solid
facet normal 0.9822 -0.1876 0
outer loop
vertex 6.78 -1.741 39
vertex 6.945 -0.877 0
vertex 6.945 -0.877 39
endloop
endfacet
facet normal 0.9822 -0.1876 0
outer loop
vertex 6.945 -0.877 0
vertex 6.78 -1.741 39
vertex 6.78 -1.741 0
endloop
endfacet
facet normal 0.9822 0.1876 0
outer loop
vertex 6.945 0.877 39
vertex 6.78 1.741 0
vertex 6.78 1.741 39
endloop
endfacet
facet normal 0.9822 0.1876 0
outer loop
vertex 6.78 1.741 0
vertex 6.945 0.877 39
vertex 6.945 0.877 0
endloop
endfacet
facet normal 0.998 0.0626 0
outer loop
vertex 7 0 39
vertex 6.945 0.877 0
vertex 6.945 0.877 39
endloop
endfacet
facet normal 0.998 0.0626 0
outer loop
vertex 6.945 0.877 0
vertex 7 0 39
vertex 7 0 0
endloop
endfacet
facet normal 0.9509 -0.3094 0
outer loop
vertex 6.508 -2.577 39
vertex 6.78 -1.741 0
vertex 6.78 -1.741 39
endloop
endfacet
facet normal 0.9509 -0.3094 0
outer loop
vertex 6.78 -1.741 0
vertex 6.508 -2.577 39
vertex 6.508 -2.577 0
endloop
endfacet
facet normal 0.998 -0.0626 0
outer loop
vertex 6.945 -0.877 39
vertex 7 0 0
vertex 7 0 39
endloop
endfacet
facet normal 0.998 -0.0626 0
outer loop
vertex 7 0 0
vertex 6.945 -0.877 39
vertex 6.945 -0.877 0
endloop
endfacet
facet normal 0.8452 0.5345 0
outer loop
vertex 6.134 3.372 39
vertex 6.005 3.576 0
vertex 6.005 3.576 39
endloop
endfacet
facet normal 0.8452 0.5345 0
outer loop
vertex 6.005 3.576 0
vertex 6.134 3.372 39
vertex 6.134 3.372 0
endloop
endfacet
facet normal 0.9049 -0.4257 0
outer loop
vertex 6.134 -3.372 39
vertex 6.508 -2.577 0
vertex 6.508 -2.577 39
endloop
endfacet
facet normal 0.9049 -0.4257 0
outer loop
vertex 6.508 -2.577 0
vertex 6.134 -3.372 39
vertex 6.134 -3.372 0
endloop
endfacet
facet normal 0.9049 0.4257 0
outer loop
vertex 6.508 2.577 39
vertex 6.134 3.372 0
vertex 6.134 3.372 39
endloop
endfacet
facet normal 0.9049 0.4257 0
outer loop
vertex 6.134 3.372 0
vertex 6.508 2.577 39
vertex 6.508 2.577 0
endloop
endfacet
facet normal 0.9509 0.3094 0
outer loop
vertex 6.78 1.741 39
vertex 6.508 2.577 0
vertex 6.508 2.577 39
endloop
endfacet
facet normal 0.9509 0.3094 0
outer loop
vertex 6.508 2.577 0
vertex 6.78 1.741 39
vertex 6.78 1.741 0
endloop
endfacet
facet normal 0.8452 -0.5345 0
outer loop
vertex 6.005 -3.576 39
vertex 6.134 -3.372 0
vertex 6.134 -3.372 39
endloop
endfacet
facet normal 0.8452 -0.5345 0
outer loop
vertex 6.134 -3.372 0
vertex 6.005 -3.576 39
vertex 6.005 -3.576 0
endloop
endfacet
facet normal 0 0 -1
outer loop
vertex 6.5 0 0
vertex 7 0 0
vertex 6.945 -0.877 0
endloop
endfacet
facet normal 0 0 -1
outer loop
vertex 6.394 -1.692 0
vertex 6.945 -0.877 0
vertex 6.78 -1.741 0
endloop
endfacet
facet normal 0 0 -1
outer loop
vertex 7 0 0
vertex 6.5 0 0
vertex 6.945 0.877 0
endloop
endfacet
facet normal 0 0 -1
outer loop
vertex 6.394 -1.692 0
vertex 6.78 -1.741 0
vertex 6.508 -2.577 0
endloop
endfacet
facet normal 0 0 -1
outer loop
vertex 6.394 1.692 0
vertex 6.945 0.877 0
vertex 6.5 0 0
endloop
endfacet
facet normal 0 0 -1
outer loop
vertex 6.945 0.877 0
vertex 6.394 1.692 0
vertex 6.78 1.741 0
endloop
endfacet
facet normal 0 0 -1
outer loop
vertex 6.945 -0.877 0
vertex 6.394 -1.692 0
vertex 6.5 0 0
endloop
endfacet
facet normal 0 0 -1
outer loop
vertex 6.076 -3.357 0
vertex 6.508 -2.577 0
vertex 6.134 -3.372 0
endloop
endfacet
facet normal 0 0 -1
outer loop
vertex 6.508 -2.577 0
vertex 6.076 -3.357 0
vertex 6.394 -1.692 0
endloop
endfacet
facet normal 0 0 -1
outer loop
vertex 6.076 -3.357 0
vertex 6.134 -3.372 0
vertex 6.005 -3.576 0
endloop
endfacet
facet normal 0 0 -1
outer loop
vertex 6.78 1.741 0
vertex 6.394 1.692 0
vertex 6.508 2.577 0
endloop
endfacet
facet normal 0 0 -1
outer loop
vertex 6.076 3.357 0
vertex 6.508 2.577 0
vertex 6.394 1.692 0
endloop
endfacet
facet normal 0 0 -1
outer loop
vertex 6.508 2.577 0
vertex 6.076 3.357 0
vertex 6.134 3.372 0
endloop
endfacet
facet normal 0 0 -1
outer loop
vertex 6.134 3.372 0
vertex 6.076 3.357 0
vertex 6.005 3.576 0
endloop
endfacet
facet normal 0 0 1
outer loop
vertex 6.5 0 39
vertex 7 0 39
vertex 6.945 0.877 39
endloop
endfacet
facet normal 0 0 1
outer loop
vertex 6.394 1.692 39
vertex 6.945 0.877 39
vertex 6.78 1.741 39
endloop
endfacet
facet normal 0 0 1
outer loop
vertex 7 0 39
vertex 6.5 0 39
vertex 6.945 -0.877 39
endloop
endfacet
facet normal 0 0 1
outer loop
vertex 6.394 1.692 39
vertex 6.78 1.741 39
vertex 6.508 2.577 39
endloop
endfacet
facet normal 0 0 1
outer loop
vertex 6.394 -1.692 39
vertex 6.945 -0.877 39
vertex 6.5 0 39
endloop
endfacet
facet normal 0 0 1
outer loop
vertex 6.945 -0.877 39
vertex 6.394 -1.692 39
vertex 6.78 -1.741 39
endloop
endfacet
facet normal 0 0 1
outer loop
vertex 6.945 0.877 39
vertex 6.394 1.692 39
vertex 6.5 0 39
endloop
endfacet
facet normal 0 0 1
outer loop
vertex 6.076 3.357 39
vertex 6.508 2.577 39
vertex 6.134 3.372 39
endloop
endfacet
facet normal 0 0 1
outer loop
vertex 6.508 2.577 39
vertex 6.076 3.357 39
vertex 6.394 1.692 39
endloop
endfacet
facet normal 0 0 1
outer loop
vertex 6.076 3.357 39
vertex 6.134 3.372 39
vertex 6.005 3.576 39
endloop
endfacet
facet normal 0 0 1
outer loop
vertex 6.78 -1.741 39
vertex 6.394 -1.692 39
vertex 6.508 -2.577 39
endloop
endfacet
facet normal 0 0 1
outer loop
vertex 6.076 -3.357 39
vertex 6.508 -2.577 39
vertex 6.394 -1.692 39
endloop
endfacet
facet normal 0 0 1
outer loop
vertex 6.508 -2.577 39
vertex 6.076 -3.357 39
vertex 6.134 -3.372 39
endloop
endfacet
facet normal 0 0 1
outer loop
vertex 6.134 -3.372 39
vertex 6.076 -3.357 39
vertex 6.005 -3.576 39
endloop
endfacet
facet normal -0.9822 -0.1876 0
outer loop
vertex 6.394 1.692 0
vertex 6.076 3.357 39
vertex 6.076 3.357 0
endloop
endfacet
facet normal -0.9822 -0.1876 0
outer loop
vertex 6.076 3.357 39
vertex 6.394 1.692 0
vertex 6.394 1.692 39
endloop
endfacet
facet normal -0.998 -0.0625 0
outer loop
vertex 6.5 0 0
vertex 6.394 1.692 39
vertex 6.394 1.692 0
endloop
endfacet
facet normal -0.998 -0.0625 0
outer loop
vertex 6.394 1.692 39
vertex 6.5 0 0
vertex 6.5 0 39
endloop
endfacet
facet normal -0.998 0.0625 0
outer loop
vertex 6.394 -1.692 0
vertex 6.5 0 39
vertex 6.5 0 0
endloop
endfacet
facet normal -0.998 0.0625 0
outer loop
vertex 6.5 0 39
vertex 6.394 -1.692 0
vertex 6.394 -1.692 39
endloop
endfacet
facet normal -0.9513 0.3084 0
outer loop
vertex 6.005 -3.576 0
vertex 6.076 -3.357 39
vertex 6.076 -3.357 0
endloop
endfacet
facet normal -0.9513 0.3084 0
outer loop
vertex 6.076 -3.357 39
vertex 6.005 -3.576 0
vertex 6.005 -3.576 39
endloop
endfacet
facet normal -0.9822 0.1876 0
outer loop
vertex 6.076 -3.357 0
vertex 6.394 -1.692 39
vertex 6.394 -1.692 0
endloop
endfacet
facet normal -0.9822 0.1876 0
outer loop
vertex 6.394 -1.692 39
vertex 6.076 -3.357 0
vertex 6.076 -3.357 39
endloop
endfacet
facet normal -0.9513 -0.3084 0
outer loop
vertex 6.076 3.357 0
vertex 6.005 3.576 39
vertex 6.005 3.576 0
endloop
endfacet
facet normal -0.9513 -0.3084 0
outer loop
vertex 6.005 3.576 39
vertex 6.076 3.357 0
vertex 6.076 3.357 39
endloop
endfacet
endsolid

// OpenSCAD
$fn = 50;


difference() {
	union() {
		cylinder(h = 39, r = 7.0000000000);
		translate(v = [-10.0000000000, 0, 0]) {
			cylinder(h = 39, r = 7.0000000000);
		}
	}
	union() {
		cylinder(h = 39, r = 3.2500000000);
		cylinder(h = 39, r = 1.8000000000);
		cylinder(h = 39, r = 1.8000000000);
		cylinder(h = 39, r = 1.8000000000);
		translate(v = [-14.5000000000, 0, 0]) {
			hull() {
				translate(v = [-3.7500000000, 0.0000000000, 0]) {
					cylinder(h = 39, r = 7.5000000000);
				}
				translate(v = [3.7500000000, 0.0000000000, 0]) {
					cylinder(h = 39, r = 7.5000000000);
				}
				translate(v = [-3.7500000000, -0.0000000000, 0]) {
					cylinder(h = 39, r = 7.5000000000);
				}
				translate(v = [3.7500000000, -0.0000000000, 0]) {
					cylinder(h = 39, r = 7.5000000000);
				}
			}
		}
		translate(v = [-7.0000000000, 0, 0.0000000000]) {
			cylinder(h = 39, r = 13.5000000000);
		}
	}
}
